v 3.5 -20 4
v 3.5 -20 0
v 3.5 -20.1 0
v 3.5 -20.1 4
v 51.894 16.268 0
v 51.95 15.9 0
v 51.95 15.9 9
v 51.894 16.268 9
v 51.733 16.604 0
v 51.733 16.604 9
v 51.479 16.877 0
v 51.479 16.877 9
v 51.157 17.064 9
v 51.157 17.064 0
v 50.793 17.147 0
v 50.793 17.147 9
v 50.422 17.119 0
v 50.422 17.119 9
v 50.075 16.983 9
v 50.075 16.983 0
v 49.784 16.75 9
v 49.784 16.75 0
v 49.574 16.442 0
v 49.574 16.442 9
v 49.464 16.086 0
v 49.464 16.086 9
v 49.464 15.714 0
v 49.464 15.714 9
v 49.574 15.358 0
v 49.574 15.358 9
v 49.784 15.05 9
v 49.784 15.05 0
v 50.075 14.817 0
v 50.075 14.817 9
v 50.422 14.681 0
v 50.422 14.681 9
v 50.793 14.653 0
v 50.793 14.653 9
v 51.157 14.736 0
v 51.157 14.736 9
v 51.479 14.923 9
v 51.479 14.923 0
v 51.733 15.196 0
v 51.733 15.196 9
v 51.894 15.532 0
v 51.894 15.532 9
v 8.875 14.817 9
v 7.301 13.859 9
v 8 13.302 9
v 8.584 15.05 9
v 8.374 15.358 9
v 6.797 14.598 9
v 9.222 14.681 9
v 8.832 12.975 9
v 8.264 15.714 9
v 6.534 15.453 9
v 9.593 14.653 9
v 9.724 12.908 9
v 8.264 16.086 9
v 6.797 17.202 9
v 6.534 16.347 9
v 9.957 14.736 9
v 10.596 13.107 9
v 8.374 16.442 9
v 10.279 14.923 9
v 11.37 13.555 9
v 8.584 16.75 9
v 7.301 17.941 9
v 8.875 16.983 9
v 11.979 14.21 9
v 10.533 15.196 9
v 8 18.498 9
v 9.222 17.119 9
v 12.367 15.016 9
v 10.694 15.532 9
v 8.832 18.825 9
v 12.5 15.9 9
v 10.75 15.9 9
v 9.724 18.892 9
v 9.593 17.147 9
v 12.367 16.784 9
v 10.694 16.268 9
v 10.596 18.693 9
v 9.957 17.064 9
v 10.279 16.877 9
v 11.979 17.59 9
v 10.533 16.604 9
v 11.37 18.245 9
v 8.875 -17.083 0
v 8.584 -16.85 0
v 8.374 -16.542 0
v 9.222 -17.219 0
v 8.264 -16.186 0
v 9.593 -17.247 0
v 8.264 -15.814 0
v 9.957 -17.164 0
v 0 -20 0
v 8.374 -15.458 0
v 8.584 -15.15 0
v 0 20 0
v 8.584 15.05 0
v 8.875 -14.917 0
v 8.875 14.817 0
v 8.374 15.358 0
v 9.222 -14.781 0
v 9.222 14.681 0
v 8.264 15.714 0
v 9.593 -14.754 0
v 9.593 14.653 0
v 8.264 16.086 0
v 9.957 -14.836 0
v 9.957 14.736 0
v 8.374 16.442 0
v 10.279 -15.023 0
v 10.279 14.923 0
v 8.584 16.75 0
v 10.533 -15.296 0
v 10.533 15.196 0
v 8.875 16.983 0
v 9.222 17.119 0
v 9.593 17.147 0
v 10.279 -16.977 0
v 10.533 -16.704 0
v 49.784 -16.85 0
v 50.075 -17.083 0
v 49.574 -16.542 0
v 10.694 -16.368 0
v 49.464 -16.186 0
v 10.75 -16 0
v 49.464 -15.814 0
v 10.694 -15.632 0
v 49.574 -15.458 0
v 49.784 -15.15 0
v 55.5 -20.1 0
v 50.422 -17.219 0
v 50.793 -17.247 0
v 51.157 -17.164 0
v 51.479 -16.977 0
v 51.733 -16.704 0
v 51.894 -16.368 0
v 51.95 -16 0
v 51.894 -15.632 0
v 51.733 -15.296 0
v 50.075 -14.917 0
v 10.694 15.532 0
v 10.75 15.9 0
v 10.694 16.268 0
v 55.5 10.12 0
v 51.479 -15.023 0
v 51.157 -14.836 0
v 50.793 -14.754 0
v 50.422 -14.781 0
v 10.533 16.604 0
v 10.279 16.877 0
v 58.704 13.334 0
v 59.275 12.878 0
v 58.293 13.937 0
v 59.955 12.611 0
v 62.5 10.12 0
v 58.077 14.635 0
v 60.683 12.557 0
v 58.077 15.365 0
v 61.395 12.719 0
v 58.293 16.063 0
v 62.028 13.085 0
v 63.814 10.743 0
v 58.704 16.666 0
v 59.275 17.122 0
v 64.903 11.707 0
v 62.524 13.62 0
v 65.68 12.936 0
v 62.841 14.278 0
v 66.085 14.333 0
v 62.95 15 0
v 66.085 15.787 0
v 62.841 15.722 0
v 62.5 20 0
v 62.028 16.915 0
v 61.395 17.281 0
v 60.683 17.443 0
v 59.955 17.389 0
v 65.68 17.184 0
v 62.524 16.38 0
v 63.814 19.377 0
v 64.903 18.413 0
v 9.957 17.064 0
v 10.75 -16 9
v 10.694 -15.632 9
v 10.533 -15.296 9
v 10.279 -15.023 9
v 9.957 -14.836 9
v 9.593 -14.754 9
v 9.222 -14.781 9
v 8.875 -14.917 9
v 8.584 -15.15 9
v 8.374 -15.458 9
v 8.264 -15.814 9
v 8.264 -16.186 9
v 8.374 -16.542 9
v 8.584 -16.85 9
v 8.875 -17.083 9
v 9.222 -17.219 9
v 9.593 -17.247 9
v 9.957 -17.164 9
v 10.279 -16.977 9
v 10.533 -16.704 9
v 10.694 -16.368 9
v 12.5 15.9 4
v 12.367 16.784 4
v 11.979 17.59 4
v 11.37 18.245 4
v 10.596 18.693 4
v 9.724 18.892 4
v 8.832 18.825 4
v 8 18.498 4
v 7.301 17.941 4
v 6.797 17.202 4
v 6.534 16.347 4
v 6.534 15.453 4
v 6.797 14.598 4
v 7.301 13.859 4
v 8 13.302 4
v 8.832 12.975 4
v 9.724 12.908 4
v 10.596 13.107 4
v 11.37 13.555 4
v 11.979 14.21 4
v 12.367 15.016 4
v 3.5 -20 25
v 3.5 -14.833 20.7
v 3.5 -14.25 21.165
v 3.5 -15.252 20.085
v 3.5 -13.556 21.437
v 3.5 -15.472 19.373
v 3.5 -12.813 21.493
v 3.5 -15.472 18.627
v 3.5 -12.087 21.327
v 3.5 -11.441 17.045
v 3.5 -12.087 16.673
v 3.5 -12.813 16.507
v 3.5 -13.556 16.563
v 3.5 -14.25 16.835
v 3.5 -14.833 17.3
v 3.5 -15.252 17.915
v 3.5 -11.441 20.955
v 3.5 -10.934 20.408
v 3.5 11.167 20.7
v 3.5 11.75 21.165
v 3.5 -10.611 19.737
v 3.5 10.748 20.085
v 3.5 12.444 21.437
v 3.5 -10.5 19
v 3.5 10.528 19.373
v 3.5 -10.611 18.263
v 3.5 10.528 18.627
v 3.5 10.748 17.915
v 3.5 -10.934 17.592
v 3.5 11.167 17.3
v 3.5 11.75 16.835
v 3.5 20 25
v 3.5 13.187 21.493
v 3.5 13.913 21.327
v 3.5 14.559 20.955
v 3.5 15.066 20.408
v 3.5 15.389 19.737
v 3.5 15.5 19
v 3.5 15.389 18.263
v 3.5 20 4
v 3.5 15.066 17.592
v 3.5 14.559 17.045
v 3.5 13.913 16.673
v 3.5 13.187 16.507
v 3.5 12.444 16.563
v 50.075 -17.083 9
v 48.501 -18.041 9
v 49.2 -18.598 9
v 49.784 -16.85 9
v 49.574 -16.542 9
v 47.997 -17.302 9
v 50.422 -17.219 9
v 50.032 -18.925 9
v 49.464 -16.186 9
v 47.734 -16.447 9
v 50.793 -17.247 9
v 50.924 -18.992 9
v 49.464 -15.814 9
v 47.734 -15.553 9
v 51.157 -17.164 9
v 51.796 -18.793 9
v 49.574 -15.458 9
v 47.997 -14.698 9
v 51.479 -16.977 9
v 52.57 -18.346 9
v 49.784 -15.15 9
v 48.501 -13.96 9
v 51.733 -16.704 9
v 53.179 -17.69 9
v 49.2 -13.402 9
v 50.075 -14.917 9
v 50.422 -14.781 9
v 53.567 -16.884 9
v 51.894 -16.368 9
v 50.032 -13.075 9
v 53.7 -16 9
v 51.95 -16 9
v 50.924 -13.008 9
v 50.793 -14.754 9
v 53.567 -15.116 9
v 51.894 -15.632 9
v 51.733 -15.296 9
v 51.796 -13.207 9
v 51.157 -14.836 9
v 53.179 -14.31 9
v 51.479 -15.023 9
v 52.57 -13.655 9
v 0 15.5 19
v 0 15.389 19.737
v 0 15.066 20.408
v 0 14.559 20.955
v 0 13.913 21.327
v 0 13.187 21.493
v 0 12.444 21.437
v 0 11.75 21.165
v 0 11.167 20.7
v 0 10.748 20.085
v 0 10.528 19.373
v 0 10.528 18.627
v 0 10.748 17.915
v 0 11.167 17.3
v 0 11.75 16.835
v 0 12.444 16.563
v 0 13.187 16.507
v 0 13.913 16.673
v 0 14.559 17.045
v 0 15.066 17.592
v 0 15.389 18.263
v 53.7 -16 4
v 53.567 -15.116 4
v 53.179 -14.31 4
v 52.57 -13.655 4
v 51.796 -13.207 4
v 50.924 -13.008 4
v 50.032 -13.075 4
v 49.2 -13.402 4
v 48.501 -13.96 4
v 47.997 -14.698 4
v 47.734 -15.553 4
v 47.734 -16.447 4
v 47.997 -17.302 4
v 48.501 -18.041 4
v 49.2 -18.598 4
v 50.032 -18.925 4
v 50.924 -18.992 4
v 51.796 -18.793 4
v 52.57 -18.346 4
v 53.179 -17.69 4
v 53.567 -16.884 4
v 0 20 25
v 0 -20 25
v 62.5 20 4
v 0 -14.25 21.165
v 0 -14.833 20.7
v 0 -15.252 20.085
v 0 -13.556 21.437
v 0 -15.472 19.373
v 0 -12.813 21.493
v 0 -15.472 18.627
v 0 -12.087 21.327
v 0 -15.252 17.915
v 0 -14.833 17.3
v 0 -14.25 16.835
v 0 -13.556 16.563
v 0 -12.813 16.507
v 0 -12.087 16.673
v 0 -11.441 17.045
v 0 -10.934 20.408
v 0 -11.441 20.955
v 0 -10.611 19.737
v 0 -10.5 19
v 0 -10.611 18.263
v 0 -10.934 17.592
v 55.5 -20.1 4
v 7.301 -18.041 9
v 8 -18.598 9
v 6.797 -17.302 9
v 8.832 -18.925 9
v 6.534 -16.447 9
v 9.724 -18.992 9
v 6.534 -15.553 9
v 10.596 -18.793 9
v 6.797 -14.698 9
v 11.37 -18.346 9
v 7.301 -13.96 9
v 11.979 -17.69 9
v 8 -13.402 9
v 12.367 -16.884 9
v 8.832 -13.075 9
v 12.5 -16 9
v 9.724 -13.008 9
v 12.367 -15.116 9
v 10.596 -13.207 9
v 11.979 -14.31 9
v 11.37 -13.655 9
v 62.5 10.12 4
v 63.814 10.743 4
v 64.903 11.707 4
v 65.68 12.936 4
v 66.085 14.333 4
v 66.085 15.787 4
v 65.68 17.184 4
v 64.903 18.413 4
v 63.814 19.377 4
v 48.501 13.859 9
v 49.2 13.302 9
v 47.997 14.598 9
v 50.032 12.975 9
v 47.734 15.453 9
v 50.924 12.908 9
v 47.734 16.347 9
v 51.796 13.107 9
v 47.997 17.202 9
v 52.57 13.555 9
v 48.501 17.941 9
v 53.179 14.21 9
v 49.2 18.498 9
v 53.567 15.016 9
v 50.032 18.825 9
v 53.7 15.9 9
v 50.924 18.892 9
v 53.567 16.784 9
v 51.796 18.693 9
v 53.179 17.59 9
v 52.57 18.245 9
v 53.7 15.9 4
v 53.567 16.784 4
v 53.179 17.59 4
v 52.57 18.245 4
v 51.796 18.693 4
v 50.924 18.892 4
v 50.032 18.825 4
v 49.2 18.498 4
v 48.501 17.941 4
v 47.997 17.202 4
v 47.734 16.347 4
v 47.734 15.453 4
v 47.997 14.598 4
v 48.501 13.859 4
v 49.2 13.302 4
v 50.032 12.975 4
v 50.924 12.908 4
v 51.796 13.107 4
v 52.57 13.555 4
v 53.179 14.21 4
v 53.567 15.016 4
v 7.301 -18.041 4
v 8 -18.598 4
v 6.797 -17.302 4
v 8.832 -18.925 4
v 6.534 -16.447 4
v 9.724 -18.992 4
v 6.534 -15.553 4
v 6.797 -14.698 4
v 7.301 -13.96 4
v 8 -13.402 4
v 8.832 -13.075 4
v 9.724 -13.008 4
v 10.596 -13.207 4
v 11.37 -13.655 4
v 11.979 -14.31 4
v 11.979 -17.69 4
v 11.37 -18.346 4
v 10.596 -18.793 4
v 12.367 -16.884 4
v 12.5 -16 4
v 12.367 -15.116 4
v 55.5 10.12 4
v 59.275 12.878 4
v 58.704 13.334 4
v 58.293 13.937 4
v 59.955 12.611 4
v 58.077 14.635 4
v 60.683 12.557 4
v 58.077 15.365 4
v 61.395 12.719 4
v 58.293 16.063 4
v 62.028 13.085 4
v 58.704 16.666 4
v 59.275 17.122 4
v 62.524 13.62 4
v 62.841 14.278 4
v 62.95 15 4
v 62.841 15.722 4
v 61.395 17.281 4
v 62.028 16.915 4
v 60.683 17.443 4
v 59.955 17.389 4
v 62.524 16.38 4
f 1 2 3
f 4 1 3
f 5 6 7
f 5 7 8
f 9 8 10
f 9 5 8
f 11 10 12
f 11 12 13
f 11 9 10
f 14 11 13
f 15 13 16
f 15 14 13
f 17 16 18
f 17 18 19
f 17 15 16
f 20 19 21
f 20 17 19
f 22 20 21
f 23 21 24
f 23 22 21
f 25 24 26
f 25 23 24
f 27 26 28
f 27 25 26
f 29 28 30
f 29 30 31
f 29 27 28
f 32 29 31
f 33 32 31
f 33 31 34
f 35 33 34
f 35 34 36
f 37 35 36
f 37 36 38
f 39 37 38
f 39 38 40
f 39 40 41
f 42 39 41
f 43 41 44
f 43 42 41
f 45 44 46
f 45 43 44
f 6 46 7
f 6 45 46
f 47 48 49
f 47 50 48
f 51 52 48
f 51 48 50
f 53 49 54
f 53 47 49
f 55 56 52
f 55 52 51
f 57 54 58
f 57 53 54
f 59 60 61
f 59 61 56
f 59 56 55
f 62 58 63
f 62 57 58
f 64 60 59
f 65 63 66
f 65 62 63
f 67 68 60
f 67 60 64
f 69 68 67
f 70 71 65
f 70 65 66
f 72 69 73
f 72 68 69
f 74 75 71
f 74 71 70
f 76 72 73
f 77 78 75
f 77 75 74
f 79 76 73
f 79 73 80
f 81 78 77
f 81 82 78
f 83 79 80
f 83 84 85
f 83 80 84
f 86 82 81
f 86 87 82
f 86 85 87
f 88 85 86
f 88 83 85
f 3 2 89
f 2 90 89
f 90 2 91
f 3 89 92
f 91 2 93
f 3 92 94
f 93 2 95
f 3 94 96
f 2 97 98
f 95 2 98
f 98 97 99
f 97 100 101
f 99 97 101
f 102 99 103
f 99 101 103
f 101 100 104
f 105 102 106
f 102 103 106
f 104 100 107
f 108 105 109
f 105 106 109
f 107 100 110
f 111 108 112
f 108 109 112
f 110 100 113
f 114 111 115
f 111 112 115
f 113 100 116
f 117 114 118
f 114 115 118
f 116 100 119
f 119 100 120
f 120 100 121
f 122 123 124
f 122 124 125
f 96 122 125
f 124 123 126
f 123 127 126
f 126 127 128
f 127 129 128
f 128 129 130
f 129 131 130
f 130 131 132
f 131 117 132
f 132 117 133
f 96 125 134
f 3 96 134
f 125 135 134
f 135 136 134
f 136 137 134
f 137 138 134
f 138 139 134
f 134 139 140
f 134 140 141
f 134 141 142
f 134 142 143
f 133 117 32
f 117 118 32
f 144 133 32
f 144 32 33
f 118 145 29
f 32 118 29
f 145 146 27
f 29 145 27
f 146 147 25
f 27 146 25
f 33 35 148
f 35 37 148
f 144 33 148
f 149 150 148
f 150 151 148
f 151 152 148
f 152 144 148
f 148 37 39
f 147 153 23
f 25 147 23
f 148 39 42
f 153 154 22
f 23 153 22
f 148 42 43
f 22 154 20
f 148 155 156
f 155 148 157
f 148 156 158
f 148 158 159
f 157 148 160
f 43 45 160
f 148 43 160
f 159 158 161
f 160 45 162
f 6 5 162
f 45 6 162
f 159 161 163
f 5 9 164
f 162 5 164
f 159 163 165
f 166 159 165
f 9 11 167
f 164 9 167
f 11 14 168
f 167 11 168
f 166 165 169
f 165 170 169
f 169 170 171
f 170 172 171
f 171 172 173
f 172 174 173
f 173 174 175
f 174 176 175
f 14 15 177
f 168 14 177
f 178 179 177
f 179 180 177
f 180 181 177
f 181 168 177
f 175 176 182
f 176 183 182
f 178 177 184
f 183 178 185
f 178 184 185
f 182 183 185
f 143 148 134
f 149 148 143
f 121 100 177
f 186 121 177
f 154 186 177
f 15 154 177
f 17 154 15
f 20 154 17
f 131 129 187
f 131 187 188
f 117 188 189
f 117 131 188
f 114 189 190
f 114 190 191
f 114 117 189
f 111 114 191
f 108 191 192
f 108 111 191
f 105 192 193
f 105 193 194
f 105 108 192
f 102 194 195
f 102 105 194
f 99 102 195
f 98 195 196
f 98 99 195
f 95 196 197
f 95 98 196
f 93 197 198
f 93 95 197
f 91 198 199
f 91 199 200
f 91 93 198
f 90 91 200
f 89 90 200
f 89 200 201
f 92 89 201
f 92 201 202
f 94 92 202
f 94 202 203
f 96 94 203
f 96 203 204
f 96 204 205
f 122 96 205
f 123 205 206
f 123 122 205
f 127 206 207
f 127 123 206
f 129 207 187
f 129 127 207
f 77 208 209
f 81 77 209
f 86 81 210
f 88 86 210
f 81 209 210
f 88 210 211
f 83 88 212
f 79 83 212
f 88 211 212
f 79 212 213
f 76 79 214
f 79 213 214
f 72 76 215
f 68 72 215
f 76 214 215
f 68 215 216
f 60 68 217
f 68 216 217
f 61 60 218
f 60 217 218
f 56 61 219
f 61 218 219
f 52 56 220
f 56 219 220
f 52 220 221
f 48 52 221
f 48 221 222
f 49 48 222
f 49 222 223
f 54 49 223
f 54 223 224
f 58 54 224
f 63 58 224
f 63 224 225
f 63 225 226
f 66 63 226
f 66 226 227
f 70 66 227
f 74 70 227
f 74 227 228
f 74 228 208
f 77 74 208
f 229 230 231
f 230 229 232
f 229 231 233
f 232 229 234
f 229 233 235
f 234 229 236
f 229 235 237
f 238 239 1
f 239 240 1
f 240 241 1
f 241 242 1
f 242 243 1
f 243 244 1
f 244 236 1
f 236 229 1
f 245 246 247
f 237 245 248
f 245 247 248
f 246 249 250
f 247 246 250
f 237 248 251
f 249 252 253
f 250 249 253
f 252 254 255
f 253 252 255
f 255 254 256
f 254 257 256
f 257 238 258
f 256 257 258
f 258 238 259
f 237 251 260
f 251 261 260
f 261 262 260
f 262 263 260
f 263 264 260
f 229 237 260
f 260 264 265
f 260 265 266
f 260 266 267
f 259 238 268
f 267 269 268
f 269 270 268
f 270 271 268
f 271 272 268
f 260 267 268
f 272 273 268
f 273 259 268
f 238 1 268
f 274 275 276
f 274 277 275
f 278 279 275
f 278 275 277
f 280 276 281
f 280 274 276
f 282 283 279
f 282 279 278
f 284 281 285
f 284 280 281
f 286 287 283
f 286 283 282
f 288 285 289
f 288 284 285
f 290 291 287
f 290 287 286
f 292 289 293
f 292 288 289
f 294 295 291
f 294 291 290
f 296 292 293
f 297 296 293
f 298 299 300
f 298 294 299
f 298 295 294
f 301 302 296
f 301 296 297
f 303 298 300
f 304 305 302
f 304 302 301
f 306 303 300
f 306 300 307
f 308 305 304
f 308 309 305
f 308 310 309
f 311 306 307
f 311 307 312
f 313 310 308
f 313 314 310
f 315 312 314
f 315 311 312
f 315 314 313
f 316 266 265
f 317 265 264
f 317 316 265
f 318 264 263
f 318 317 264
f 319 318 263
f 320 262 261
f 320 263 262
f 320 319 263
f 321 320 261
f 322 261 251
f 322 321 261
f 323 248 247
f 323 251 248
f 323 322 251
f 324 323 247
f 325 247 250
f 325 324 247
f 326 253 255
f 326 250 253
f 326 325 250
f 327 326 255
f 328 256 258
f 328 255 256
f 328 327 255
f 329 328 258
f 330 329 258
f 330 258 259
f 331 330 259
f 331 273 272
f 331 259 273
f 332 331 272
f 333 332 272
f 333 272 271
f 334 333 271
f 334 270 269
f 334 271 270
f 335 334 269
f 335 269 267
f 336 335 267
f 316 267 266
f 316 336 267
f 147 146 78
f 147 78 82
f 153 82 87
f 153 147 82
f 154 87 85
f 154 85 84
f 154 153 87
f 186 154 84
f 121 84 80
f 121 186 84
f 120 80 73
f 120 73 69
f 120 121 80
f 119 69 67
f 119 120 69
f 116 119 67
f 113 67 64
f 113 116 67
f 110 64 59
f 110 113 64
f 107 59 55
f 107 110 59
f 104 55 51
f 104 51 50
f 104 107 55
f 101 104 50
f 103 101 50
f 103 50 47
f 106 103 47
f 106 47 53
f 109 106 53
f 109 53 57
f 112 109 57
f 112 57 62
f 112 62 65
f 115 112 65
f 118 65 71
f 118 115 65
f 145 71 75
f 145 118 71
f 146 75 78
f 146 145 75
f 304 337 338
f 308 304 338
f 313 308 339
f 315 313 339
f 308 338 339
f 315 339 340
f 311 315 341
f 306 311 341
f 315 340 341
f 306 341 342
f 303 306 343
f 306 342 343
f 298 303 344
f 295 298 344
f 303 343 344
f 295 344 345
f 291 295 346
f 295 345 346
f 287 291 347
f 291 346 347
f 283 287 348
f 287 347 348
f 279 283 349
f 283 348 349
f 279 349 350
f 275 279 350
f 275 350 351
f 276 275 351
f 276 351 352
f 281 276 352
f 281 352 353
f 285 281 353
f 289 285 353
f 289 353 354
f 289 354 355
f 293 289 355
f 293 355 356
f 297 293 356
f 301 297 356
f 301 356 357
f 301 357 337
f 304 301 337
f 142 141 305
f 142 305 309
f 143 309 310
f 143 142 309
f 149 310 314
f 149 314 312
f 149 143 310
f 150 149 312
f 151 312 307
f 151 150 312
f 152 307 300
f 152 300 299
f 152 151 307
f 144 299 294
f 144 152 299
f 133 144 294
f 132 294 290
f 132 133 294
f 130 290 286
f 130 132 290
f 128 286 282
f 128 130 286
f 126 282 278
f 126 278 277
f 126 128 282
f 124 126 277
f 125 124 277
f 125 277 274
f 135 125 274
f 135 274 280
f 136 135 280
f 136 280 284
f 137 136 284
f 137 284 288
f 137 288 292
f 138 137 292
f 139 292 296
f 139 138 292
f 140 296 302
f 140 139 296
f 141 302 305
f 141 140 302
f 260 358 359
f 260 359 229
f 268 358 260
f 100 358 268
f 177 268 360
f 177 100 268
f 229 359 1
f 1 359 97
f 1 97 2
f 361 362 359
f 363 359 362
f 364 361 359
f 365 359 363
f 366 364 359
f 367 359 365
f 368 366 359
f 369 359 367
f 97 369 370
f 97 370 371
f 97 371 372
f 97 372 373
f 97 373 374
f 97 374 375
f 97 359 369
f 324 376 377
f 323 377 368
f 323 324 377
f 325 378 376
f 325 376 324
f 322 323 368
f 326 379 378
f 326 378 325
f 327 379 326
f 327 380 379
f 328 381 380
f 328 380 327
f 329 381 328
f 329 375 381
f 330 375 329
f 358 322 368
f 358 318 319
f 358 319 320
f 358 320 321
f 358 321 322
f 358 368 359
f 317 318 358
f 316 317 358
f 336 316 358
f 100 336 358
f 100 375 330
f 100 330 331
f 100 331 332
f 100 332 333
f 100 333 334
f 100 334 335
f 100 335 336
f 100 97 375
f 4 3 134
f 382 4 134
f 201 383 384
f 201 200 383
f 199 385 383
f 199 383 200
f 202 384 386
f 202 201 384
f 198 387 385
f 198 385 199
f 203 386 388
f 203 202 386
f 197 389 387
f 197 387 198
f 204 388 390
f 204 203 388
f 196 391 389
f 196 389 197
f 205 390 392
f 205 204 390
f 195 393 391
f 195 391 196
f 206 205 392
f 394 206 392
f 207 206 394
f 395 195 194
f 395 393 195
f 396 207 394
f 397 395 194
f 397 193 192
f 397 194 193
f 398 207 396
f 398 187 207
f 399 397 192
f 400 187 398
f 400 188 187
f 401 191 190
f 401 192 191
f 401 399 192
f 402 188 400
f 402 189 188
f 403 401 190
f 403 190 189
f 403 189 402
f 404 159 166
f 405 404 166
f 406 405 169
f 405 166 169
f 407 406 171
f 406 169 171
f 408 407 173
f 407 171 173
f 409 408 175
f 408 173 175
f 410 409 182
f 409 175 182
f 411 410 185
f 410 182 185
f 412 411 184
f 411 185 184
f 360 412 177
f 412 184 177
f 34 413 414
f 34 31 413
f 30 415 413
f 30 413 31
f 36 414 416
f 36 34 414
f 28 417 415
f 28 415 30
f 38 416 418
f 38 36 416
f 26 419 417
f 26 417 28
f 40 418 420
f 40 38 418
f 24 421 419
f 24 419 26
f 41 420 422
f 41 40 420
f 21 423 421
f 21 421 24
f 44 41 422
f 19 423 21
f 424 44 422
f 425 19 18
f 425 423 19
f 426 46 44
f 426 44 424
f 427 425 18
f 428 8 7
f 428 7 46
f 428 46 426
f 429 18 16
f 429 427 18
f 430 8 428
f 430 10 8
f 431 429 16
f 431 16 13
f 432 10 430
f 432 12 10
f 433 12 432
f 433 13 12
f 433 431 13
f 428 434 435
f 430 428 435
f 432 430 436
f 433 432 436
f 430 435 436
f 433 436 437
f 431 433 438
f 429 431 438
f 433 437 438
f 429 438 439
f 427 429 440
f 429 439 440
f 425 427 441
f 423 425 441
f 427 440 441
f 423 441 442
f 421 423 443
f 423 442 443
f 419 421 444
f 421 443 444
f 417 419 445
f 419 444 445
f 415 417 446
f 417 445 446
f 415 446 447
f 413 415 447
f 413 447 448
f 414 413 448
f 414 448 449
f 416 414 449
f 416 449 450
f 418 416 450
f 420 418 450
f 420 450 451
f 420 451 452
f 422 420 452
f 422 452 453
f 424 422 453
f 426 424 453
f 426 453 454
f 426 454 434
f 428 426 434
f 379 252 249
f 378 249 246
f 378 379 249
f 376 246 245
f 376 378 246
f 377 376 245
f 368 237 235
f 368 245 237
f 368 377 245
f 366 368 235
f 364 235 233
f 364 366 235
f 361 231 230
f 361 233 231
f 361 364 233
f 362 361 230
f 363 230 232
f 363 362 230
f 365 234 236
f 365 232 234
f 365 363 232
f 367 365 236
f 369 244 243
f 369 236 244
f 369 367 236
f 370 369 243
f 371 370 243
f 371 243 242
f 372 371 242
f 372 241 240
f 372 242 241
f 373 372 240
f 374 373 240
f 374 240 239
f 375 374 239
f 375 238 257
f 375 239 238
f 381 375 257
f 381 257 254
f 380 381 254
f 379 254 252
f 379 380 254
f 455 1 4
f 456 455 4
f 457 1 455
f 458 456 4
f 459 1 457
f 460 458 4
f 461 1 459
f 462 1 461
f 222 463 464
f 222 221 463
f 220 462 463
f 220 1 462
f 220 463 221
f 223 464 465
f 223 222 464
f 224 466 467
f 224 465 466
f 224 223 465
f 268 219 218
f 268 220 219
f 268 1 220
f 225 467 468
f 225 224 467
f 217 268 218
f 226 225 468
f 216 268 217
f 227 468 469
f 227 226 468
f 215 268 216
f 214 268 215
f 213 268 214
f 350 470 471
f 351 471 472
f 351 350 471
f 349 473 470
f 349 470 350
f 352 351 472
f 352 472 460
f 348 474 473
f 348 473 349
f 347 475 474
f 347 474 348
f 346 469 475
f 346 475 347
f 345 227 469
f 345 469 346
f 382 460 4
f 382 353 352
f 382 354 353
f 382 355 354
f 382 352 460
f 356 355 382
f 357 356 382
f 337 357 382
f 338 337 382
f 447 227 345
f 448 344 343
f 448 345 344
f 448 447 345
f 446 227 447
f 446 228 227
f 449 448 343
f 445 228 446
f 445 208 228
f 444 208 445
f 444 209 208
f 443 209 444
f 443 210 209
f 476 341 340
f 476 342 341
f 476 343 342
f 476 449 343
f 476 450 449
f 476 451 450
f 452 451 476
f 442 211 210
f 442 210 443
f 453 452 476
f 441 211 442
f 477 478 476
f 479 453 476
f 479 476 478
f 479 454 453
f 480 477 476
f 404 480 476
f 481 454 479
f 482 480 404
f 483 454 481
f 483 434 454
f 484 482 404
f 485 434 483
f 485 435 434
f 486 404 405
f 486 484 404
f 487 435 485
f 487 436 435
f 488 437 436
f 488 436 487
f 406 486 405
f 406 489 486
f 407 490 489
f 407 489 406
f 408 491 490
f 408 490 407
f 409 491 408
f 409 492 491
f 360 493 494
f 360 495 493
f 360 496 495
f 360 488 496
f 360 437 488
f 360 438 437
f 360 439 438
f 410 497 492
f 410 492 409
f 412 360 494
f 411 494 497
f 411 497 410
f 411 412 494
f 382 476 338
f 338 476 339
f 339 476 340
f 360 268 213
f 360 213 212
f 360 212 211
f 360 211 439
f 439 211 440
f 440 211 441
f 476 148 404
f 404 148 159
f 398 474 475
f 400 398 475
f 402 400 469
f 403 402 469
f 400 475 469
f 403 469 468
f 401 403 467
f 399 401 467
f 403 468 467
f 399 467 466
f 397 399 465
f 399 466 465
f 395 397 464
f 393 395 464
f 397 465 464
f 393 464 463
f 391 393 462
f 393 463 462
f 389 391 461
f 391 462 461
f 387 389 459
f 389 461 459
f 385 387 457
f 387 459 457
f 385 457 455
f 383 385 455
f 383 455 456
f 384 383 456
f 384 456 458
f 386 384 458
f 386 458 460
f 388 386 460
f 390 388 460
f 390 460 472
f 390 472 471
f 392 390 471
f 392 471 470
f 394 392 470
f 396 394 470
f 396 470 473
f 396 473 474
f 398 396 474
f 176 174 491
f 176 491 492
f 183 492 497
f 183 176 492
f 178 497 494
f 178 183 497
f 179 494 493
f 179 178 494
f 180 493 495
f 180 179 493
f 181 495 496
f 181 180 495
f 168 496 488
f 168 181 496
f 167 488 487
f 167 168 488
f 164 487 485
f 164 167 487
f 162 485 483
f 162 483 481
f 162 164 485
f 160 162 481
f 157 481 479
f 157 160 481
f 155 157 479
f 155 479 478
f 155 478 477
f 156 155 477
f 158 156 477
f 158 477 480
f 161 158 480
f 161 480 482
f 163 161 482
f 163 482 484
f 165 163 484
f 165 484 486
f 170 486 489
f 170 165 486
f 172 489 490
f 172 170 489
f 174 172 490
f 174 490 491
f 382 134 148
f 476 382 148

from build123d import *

# Parameters (mm, degrees)
F0_R     = 3
F0_R_2   = 2.45
F1_DEPTH = 4
F0_R_3   = 1.25
F2_DEPTH = 9
F0_W     = 3.5
F0_H     = 40
F3_DEPTH = 25
F4_R     = 2.5
F5_DEPTH = 25


with BuildPart() as f1:
    # F0 (on Top) → F1 (new body)
    with BuildSketch(Plane.XY):
        with BuildLine():
            Line((54.6, 20), (3.5, 20))
            Line((3.5, 20), (3.5, -20))
            Line((3.5, -20), (3.5, -20.100027))
            Line((3.5, -20.100027), (55.5, -20.100027))
            Line((55.5, -20.100027), (55.5, 10.120172))
            Line((55.5, 10.120172), (62.5, 10.120172))
            ThreePointArc((62.5, 10.120172), (66.136013, 15.060086), (62.5, 20))
            Line((62.5, 20), (54.6, 20))
        make_face()
        with Locations((9.5, -16.000027)):
            Circle(F0_R, mode=Mode.SUBTRACT)
        with Locations((50.7, -16.000027)):
            Circle(F0_R, mode=Mode.SUBTRACT)
        with Locations((9.5, 15.9)):
            Circle(F0_R, mode=Mode.SUBTRACT)
        with Locations((50.7, 15.9)):
            Circle(F0_R, mode=Mode.SUBTRACT)
        with Locations((60.5, 15)):
            Circle(F0_R_2, mode=Mode.SUBTRACT)
    extrude(amount=F1_DEPTH)

    # F0 (on Top) → F2 (join)
    with BuildSketch(Plane.XY):
        with Locations((9.5, 15.9)):
            Circle(F0_R)
        with Locations((9.5, 15.9)):
            Circle(F0_R_3, mode=Mode.SUBTRACT)
        with Locations((50.7, 15.9)):
            Circle(F0_R)
        with Locations((50.7, 15.9)):
            Circle(F0_R_3, mode=Mode.SUBTRACT)
        with Locations((50.7, -16.000027)):
            Circle(F0_R)
        with Locations((50.7, -16.000027)):
            Circle(F0_R_3, mode=Mode.SUBTRACT)
        with Locations((9.5, -16.000027)):
            Circle(F0_R)
        with Locations((9.5, -16.000027)):
            Circle(F0_R_3, mode=Mode.SUBTRACT)
    extrude(amount=F2_DEPTH)

    # F0 (on Top) → F3 (join)
    with BuildSketch(Plane.XY):
        with Locations((1.75, 0)):
            Rectangle(F0_W, F0_H)
    extrude(amount=F3_DEPTH)

    # F4 (on Right) → F5 (cut)
    with BuildSketch(Plane.YZ):
        with Locations((13, 19)):
            Circle(F4_R)
        with Locations((-13, 19)):
            Circle(F4_R)
    extrude(amount=F5_DEPTH, mode=Mode.SUBTRACT)


solid = f1.part
